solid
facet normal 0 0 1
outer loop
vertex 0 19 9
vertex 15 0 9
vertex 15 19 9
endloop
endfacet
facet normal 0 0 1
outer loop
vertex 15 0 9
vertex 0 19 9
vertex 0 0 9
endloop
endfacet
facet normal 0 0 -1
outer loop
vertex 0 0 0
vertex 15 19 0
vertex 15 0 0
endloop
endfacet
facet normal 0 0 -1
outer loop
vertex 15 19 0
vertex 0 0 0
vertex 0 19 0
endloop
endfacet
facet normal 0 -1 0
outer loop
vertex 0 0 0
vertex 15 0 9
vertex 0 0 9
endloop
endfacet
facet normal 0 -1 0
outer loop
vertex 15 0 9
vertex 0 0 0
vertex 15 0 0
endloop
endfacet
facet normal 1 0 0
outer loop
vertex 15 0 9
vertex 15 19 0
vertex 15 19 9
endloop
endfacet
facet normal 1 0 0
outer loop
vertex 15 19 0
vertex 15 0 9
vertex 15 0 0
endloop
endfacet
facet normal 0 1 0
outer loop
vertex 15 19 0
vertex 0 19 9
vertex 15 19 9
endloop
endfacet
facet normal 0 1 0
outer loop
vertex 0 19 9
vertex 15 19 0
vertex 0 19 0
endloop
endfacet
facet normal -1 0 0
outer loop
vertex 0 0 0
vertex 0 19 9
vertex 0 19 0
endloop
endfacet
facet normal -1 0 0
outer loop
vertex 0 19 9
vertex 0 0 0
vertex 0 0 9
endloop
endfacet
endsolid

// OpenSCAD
// Generated by SolidPython 1.0.1 on 2020-07-29 00:46:56


cube(size = [15, 19, 9]);
/***********************************************
*********      SolidPython code:      **********
************************************************
 
# import packages: SolidPython
from solid import *
from solid.utils import *
from itertools import chain, combinations, permutations


class Resize:

    def __init__(self, scad_file):
        self.scad_file = scad_file
        #self.scad_file = import_scad(scad_file)
        # cone/cylinder param:
        self.r1 = 0
        self.r2 = 0
        self.h = 0
        # rectangular prism param:
        self.w = 0
        self.l = 0
        # ellipse param:
        self.r = 0

    # import OpenScad code (file name corresponds to shape)


    # classify shape + parameters
    def assign(self, param1, param2, param3):
        if self.scad_file == 'cone.scad':
            self.r1 = param1
            self.r2 = param2
            self.h = param3
        elif self.scad_file == 'cylinder.scad':
            self.r1 = param1
            self.r2 = param2
            self.h = param3
        elif self.scad_file == 'rectangularPrism.scad':
            self.h = param1
            self.l = param2
            self.w = param3
        else:
            self.r = param1
            self.h = param2

    # resize parameters
    def iterate(self):
        x = range(3, 20, 2)
        i = 1
        if self.scad_file == 'cone.scad':
            tempList = list(permutations(x, 2))
            for temp in tempList:
                param1 = temp[0]
                param2 = temp[1]
                filepath = 'produced_scad_files/' + 'cone' + str(param1) + '_' + str(param2) + '_' + '.scad'
                scad_render_to_file(cylinder(h=param1, r1=param2, r2=0), filepath)

        elif self.scad_file == 'cylinder.scad':
            tempList = list(permutations(x, 3))
            for temp in tempList:
                param1 = temp[0]
                param2 = temp[1]
                filepath = 'produced_scad_files/' + 'cylinder' + str(param1) + '_' + str(param2) + '_' + '.scad'
                scad_render_to_file(cylinder(h=param1, r1=param2, r2=param2), filepath)

        elif self.scad_file == 'rectangularPrism.scad':
            tempList = list(permutations(x, 3))
            for temp in tempList:
                param1 = temp[0]
                param2 = temp[1]
                param3 = temp[2]
                filepath = 'produced_scad_files/' + 'rectangularPrism' + str(param1) + '_' + str(param2) + '_' + str(
                    param3) + '.scad'
                scad_render_to_file(cube(size=(param1, param2, param3)), filepath)

        elif self.scad_file == 'ellipse.scad':
            tempList = list(permutations(x, 4))
            for temp in tempList:
                param1 = temp[0]
                param2 = temp[1]
                param3 = temp[2]
                param4 = temp[3]
                filepath = 'produced_scad_files/' + 'ellipse' + str(param1) + '_' + str(param2) + '_' + str(param3) + '_' + str(param4) + '.scad'
                scad_render_to_file(scale([param1, param2, param3])(sphere(r=param4)), filepath)

    def render_to_scadfile(self):
        scad_render_to_file(scad, 'example.scad') 
 
************************************************/
